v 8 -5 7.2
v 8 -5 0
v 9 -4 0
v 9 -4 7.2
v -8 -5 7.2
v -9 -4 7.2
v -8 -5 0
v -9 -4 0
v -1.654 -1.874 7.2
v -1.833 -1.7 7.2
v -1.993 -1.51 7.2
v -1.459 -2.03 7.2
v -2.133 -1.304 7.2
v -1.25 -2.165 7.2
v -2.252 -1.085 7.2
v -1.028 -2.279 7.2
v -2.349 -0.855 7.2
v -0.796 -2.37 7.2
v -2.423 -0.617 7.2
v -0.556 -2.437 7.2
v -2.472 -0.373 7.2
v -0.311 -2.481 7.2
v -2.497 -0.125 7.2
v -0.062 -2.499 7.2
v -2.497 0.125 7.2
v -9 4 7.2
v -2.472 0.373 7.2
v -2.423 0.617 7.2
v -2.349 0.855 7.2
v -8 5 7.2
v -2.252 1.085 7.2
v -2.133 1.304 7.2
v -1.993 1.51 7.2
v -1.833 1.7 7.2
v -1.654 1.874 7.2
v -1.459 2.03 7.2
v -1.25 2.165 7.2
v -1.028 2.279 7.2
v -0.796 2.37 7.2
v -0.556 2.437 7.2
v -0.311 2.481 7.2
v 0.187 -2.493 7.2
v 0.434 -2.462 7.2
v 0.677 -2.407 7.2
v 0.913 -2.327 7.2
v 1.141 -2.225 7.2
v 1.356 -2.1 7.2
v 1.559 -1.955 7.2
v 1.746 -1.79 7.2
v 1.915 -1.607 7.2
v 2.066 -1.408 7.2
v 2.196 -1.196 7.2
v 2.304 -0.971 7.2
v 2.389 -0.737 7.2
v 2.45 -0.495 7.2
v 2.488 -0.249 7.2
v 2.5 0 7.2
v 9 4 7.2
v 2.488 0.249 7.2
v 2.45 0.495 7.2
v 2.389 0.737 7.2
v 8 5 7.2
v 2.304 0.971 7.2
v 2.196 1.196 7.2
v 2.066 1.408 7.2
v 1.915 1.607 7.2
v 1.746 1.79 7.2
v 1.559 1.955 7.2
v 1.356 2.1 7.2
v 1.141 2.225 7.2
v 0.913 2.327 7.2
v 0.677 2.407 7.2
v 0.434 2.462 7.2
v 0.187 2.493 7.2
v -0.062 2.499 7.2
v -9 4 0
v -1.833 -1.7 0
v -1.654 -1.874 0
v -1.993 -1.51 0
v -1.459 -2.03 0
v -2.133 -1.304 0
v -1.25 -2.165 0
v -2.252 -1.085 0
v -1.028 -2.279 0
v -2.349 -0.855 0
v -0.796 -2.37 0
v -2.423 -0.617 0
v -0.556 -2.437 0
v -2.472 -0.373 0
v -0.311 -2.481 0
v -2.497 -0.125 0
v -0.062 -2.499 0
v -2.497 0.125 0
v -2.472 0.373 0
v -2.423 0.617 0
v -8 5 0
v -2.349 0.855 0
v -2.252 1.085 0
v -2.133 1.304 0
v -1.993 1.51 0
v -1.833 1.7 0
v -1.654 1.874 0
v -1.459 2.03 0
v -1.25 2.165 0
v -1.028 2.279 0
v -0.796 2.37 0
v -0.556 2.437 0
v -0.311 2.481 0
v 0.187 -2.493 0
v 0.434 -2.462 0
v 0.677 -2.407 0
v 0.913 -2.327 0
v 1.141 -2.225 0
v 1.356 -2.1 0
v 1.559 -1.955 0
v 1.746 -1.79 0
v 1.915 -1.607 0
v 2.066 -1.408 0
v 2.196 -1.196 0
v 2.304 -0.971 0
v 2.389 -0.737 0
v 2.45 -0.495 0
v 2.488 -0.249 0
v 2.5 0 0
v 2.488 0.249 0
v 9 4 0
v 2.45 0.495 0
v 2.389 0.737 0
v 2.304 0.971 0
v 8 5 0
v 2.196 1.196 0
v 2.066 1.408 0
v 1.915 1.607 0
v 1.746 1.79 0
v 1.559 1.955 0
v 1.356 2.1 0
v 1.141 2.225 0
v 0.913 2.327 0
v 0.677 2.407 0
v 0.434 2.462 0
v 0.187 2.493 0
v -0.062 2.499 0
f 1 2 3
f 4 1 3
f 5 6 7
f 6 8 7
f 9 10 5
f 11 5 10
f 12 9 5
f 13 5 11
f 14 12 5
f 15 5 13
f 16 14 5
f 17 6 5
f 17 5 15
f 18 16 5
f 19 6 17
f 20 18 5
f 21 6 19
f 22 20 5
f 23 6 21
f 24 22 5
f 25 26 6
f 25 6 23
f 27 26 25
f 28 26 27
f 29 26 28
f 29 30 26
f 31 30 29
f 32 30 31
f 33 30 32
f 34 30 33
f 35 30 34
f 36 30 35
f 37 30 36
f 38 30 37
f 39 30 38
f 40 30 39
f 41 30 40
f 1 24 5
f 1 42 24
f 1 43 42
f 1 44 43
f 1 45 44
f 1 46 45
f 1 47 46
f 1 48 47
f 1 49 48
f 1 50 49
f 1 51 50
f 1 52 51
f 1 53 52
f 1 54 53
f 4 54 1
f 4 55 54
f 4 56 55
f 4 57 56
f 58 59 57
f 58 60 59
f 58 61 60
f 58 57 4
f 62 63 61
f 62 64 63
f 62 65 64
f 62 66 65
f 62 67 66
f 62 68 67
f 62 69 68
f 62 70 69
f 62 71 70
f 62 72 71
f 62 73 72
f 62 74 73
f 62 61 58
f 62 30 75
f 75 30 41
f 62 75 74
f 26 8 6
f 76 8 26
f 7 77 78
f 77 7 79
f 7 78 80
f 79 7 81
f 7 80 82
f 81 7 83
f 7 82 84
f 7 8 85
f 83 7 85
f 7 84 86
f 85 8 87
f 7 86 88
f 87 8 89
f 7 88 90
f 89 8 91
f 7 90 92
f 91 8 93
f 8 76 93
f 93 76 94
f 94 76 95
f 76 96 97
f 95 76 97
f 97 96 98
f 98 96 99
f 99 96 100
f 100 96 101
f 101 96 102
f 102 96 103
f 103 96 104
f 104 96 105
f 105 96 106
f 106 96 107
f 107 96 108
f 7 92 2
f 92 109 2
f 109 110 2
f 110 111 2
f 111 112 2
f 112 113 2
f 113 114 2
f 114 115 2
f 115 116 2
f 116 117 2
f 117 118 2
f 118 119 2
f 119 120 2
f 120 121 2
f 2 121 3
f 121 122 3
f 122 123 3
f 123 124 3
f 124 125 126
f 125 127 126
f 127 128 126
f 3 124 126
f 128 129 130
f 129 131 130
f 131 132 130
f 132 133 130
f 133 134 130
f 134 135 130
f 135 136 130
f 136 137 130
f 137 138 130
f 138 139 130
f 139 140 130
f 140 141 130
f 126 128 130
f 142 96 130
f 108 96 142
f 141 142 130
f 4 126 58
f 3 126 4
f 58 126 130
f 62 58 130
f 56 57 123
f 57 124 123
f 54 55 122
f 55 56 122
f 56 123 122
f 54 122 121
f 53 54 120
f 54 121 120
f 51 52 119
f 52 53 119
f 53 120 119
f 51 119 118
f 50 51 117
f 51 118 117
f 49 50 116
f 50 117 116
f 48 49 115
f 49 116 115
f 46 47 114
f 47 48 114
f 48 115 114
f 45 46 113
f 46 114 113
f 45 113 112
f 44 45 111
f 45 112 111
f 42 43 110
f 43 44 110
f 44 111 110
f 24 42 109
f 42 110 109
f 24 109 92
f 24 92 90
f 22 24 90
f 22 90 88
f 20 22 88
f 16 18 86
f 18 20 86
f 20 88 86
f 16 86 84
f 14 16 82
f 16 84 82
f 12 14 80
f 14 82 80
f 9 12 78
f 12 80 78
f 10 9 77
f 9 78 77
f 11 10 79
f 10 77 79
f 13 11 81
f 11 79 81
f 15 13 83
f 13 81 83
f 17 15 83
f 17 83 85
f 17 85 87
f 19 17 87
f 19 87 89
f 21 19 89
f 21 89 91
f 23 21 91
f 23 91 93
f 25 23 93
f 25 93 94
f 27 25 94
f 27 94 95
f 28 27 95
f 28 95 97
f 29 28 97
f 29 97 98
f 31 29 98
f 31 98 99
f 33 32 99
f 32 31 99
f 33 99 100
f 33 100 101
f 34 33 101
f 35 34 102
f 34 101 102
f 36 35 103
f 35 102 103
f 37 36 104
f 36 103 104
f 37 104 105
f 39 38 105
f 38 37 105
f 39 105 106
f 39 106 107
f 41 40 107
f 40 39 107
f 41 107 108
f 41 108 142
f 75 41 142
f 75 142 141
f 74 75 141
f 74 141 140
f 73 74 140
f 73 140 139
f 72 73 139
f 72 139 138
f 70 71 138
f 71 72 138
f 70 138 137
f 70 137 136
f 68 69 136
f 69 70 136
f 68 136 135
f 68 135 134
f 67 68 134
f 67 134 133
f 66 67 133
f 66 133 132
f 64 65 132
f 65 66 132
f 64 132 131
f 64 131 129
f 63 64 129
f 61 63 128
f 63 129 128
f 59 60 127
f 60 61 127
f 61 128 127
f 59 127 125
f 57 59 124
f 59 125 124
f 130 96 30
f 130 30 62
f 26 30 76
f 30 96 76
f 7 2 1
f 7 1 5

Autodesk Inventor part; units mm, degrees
ref_plane "YZ Plane" through (0, 0, 0) normal (1, 0, 0) x (0, 1, 0)
ref_plane "XZ Plane" through (0, 0, 0) normal (0, 1, 0) x (-1, 0, 0)
ref_plane "XY Plane" through (0, 0, 0) normal (0, 0, 1) x (1, 0, 0)
sketch "Sketch1" plane through (0, 0, 0) normal (0, 0, 1) x (1, 0, 0)
  circle A0 centre (0, 0) radius 2.5
  line L0 (-8, 5) -> (8, 5)
  line L1 (9, 4) -> (9, -4)
  line L2 (8, -5) -> (-8, -5)
  line L3 (-9, -4) -> (-9, 4)
  line L4 (-8, 5) -> (-9, 4)
  line L5 (-9, -4) -> (-8, -5)
  line L6 (8, -5) -> (9, -4)
  line L7 (9, 4) -> (8, 5)
  point P0 (-9, 5)
  point P1 (9, -5)
  point P2 (9, 5)
  point P3 (-9, -5)
  point P4 (0, 5)
  point P5 (9, 0)
  dimension "d0" = 5
  dimension "d1" = 1
  dimension "d2" = 1
  dimension "d3" = 1
  dimension "d4" = 1
  dimension "d5" = 1
  dimension "d6" = 1
  dimension "d7" = 1
  dimension "d8" = 1
  dimension "d9" = 18
  dimension "d10" = 10
extrude "Extrusion1" add sketch "Sketch1" along normal blind 7.2
equation "\"d2\" = d1"
equation "\"d3\" = d1"
equation "\"d4\" = d3"
equation "\"d5\" = d1"
equation "\"d6\" = d5"
equation "\"d7\" = d1"
equation "\"d8\" = d7"
properties part number "Slide"
